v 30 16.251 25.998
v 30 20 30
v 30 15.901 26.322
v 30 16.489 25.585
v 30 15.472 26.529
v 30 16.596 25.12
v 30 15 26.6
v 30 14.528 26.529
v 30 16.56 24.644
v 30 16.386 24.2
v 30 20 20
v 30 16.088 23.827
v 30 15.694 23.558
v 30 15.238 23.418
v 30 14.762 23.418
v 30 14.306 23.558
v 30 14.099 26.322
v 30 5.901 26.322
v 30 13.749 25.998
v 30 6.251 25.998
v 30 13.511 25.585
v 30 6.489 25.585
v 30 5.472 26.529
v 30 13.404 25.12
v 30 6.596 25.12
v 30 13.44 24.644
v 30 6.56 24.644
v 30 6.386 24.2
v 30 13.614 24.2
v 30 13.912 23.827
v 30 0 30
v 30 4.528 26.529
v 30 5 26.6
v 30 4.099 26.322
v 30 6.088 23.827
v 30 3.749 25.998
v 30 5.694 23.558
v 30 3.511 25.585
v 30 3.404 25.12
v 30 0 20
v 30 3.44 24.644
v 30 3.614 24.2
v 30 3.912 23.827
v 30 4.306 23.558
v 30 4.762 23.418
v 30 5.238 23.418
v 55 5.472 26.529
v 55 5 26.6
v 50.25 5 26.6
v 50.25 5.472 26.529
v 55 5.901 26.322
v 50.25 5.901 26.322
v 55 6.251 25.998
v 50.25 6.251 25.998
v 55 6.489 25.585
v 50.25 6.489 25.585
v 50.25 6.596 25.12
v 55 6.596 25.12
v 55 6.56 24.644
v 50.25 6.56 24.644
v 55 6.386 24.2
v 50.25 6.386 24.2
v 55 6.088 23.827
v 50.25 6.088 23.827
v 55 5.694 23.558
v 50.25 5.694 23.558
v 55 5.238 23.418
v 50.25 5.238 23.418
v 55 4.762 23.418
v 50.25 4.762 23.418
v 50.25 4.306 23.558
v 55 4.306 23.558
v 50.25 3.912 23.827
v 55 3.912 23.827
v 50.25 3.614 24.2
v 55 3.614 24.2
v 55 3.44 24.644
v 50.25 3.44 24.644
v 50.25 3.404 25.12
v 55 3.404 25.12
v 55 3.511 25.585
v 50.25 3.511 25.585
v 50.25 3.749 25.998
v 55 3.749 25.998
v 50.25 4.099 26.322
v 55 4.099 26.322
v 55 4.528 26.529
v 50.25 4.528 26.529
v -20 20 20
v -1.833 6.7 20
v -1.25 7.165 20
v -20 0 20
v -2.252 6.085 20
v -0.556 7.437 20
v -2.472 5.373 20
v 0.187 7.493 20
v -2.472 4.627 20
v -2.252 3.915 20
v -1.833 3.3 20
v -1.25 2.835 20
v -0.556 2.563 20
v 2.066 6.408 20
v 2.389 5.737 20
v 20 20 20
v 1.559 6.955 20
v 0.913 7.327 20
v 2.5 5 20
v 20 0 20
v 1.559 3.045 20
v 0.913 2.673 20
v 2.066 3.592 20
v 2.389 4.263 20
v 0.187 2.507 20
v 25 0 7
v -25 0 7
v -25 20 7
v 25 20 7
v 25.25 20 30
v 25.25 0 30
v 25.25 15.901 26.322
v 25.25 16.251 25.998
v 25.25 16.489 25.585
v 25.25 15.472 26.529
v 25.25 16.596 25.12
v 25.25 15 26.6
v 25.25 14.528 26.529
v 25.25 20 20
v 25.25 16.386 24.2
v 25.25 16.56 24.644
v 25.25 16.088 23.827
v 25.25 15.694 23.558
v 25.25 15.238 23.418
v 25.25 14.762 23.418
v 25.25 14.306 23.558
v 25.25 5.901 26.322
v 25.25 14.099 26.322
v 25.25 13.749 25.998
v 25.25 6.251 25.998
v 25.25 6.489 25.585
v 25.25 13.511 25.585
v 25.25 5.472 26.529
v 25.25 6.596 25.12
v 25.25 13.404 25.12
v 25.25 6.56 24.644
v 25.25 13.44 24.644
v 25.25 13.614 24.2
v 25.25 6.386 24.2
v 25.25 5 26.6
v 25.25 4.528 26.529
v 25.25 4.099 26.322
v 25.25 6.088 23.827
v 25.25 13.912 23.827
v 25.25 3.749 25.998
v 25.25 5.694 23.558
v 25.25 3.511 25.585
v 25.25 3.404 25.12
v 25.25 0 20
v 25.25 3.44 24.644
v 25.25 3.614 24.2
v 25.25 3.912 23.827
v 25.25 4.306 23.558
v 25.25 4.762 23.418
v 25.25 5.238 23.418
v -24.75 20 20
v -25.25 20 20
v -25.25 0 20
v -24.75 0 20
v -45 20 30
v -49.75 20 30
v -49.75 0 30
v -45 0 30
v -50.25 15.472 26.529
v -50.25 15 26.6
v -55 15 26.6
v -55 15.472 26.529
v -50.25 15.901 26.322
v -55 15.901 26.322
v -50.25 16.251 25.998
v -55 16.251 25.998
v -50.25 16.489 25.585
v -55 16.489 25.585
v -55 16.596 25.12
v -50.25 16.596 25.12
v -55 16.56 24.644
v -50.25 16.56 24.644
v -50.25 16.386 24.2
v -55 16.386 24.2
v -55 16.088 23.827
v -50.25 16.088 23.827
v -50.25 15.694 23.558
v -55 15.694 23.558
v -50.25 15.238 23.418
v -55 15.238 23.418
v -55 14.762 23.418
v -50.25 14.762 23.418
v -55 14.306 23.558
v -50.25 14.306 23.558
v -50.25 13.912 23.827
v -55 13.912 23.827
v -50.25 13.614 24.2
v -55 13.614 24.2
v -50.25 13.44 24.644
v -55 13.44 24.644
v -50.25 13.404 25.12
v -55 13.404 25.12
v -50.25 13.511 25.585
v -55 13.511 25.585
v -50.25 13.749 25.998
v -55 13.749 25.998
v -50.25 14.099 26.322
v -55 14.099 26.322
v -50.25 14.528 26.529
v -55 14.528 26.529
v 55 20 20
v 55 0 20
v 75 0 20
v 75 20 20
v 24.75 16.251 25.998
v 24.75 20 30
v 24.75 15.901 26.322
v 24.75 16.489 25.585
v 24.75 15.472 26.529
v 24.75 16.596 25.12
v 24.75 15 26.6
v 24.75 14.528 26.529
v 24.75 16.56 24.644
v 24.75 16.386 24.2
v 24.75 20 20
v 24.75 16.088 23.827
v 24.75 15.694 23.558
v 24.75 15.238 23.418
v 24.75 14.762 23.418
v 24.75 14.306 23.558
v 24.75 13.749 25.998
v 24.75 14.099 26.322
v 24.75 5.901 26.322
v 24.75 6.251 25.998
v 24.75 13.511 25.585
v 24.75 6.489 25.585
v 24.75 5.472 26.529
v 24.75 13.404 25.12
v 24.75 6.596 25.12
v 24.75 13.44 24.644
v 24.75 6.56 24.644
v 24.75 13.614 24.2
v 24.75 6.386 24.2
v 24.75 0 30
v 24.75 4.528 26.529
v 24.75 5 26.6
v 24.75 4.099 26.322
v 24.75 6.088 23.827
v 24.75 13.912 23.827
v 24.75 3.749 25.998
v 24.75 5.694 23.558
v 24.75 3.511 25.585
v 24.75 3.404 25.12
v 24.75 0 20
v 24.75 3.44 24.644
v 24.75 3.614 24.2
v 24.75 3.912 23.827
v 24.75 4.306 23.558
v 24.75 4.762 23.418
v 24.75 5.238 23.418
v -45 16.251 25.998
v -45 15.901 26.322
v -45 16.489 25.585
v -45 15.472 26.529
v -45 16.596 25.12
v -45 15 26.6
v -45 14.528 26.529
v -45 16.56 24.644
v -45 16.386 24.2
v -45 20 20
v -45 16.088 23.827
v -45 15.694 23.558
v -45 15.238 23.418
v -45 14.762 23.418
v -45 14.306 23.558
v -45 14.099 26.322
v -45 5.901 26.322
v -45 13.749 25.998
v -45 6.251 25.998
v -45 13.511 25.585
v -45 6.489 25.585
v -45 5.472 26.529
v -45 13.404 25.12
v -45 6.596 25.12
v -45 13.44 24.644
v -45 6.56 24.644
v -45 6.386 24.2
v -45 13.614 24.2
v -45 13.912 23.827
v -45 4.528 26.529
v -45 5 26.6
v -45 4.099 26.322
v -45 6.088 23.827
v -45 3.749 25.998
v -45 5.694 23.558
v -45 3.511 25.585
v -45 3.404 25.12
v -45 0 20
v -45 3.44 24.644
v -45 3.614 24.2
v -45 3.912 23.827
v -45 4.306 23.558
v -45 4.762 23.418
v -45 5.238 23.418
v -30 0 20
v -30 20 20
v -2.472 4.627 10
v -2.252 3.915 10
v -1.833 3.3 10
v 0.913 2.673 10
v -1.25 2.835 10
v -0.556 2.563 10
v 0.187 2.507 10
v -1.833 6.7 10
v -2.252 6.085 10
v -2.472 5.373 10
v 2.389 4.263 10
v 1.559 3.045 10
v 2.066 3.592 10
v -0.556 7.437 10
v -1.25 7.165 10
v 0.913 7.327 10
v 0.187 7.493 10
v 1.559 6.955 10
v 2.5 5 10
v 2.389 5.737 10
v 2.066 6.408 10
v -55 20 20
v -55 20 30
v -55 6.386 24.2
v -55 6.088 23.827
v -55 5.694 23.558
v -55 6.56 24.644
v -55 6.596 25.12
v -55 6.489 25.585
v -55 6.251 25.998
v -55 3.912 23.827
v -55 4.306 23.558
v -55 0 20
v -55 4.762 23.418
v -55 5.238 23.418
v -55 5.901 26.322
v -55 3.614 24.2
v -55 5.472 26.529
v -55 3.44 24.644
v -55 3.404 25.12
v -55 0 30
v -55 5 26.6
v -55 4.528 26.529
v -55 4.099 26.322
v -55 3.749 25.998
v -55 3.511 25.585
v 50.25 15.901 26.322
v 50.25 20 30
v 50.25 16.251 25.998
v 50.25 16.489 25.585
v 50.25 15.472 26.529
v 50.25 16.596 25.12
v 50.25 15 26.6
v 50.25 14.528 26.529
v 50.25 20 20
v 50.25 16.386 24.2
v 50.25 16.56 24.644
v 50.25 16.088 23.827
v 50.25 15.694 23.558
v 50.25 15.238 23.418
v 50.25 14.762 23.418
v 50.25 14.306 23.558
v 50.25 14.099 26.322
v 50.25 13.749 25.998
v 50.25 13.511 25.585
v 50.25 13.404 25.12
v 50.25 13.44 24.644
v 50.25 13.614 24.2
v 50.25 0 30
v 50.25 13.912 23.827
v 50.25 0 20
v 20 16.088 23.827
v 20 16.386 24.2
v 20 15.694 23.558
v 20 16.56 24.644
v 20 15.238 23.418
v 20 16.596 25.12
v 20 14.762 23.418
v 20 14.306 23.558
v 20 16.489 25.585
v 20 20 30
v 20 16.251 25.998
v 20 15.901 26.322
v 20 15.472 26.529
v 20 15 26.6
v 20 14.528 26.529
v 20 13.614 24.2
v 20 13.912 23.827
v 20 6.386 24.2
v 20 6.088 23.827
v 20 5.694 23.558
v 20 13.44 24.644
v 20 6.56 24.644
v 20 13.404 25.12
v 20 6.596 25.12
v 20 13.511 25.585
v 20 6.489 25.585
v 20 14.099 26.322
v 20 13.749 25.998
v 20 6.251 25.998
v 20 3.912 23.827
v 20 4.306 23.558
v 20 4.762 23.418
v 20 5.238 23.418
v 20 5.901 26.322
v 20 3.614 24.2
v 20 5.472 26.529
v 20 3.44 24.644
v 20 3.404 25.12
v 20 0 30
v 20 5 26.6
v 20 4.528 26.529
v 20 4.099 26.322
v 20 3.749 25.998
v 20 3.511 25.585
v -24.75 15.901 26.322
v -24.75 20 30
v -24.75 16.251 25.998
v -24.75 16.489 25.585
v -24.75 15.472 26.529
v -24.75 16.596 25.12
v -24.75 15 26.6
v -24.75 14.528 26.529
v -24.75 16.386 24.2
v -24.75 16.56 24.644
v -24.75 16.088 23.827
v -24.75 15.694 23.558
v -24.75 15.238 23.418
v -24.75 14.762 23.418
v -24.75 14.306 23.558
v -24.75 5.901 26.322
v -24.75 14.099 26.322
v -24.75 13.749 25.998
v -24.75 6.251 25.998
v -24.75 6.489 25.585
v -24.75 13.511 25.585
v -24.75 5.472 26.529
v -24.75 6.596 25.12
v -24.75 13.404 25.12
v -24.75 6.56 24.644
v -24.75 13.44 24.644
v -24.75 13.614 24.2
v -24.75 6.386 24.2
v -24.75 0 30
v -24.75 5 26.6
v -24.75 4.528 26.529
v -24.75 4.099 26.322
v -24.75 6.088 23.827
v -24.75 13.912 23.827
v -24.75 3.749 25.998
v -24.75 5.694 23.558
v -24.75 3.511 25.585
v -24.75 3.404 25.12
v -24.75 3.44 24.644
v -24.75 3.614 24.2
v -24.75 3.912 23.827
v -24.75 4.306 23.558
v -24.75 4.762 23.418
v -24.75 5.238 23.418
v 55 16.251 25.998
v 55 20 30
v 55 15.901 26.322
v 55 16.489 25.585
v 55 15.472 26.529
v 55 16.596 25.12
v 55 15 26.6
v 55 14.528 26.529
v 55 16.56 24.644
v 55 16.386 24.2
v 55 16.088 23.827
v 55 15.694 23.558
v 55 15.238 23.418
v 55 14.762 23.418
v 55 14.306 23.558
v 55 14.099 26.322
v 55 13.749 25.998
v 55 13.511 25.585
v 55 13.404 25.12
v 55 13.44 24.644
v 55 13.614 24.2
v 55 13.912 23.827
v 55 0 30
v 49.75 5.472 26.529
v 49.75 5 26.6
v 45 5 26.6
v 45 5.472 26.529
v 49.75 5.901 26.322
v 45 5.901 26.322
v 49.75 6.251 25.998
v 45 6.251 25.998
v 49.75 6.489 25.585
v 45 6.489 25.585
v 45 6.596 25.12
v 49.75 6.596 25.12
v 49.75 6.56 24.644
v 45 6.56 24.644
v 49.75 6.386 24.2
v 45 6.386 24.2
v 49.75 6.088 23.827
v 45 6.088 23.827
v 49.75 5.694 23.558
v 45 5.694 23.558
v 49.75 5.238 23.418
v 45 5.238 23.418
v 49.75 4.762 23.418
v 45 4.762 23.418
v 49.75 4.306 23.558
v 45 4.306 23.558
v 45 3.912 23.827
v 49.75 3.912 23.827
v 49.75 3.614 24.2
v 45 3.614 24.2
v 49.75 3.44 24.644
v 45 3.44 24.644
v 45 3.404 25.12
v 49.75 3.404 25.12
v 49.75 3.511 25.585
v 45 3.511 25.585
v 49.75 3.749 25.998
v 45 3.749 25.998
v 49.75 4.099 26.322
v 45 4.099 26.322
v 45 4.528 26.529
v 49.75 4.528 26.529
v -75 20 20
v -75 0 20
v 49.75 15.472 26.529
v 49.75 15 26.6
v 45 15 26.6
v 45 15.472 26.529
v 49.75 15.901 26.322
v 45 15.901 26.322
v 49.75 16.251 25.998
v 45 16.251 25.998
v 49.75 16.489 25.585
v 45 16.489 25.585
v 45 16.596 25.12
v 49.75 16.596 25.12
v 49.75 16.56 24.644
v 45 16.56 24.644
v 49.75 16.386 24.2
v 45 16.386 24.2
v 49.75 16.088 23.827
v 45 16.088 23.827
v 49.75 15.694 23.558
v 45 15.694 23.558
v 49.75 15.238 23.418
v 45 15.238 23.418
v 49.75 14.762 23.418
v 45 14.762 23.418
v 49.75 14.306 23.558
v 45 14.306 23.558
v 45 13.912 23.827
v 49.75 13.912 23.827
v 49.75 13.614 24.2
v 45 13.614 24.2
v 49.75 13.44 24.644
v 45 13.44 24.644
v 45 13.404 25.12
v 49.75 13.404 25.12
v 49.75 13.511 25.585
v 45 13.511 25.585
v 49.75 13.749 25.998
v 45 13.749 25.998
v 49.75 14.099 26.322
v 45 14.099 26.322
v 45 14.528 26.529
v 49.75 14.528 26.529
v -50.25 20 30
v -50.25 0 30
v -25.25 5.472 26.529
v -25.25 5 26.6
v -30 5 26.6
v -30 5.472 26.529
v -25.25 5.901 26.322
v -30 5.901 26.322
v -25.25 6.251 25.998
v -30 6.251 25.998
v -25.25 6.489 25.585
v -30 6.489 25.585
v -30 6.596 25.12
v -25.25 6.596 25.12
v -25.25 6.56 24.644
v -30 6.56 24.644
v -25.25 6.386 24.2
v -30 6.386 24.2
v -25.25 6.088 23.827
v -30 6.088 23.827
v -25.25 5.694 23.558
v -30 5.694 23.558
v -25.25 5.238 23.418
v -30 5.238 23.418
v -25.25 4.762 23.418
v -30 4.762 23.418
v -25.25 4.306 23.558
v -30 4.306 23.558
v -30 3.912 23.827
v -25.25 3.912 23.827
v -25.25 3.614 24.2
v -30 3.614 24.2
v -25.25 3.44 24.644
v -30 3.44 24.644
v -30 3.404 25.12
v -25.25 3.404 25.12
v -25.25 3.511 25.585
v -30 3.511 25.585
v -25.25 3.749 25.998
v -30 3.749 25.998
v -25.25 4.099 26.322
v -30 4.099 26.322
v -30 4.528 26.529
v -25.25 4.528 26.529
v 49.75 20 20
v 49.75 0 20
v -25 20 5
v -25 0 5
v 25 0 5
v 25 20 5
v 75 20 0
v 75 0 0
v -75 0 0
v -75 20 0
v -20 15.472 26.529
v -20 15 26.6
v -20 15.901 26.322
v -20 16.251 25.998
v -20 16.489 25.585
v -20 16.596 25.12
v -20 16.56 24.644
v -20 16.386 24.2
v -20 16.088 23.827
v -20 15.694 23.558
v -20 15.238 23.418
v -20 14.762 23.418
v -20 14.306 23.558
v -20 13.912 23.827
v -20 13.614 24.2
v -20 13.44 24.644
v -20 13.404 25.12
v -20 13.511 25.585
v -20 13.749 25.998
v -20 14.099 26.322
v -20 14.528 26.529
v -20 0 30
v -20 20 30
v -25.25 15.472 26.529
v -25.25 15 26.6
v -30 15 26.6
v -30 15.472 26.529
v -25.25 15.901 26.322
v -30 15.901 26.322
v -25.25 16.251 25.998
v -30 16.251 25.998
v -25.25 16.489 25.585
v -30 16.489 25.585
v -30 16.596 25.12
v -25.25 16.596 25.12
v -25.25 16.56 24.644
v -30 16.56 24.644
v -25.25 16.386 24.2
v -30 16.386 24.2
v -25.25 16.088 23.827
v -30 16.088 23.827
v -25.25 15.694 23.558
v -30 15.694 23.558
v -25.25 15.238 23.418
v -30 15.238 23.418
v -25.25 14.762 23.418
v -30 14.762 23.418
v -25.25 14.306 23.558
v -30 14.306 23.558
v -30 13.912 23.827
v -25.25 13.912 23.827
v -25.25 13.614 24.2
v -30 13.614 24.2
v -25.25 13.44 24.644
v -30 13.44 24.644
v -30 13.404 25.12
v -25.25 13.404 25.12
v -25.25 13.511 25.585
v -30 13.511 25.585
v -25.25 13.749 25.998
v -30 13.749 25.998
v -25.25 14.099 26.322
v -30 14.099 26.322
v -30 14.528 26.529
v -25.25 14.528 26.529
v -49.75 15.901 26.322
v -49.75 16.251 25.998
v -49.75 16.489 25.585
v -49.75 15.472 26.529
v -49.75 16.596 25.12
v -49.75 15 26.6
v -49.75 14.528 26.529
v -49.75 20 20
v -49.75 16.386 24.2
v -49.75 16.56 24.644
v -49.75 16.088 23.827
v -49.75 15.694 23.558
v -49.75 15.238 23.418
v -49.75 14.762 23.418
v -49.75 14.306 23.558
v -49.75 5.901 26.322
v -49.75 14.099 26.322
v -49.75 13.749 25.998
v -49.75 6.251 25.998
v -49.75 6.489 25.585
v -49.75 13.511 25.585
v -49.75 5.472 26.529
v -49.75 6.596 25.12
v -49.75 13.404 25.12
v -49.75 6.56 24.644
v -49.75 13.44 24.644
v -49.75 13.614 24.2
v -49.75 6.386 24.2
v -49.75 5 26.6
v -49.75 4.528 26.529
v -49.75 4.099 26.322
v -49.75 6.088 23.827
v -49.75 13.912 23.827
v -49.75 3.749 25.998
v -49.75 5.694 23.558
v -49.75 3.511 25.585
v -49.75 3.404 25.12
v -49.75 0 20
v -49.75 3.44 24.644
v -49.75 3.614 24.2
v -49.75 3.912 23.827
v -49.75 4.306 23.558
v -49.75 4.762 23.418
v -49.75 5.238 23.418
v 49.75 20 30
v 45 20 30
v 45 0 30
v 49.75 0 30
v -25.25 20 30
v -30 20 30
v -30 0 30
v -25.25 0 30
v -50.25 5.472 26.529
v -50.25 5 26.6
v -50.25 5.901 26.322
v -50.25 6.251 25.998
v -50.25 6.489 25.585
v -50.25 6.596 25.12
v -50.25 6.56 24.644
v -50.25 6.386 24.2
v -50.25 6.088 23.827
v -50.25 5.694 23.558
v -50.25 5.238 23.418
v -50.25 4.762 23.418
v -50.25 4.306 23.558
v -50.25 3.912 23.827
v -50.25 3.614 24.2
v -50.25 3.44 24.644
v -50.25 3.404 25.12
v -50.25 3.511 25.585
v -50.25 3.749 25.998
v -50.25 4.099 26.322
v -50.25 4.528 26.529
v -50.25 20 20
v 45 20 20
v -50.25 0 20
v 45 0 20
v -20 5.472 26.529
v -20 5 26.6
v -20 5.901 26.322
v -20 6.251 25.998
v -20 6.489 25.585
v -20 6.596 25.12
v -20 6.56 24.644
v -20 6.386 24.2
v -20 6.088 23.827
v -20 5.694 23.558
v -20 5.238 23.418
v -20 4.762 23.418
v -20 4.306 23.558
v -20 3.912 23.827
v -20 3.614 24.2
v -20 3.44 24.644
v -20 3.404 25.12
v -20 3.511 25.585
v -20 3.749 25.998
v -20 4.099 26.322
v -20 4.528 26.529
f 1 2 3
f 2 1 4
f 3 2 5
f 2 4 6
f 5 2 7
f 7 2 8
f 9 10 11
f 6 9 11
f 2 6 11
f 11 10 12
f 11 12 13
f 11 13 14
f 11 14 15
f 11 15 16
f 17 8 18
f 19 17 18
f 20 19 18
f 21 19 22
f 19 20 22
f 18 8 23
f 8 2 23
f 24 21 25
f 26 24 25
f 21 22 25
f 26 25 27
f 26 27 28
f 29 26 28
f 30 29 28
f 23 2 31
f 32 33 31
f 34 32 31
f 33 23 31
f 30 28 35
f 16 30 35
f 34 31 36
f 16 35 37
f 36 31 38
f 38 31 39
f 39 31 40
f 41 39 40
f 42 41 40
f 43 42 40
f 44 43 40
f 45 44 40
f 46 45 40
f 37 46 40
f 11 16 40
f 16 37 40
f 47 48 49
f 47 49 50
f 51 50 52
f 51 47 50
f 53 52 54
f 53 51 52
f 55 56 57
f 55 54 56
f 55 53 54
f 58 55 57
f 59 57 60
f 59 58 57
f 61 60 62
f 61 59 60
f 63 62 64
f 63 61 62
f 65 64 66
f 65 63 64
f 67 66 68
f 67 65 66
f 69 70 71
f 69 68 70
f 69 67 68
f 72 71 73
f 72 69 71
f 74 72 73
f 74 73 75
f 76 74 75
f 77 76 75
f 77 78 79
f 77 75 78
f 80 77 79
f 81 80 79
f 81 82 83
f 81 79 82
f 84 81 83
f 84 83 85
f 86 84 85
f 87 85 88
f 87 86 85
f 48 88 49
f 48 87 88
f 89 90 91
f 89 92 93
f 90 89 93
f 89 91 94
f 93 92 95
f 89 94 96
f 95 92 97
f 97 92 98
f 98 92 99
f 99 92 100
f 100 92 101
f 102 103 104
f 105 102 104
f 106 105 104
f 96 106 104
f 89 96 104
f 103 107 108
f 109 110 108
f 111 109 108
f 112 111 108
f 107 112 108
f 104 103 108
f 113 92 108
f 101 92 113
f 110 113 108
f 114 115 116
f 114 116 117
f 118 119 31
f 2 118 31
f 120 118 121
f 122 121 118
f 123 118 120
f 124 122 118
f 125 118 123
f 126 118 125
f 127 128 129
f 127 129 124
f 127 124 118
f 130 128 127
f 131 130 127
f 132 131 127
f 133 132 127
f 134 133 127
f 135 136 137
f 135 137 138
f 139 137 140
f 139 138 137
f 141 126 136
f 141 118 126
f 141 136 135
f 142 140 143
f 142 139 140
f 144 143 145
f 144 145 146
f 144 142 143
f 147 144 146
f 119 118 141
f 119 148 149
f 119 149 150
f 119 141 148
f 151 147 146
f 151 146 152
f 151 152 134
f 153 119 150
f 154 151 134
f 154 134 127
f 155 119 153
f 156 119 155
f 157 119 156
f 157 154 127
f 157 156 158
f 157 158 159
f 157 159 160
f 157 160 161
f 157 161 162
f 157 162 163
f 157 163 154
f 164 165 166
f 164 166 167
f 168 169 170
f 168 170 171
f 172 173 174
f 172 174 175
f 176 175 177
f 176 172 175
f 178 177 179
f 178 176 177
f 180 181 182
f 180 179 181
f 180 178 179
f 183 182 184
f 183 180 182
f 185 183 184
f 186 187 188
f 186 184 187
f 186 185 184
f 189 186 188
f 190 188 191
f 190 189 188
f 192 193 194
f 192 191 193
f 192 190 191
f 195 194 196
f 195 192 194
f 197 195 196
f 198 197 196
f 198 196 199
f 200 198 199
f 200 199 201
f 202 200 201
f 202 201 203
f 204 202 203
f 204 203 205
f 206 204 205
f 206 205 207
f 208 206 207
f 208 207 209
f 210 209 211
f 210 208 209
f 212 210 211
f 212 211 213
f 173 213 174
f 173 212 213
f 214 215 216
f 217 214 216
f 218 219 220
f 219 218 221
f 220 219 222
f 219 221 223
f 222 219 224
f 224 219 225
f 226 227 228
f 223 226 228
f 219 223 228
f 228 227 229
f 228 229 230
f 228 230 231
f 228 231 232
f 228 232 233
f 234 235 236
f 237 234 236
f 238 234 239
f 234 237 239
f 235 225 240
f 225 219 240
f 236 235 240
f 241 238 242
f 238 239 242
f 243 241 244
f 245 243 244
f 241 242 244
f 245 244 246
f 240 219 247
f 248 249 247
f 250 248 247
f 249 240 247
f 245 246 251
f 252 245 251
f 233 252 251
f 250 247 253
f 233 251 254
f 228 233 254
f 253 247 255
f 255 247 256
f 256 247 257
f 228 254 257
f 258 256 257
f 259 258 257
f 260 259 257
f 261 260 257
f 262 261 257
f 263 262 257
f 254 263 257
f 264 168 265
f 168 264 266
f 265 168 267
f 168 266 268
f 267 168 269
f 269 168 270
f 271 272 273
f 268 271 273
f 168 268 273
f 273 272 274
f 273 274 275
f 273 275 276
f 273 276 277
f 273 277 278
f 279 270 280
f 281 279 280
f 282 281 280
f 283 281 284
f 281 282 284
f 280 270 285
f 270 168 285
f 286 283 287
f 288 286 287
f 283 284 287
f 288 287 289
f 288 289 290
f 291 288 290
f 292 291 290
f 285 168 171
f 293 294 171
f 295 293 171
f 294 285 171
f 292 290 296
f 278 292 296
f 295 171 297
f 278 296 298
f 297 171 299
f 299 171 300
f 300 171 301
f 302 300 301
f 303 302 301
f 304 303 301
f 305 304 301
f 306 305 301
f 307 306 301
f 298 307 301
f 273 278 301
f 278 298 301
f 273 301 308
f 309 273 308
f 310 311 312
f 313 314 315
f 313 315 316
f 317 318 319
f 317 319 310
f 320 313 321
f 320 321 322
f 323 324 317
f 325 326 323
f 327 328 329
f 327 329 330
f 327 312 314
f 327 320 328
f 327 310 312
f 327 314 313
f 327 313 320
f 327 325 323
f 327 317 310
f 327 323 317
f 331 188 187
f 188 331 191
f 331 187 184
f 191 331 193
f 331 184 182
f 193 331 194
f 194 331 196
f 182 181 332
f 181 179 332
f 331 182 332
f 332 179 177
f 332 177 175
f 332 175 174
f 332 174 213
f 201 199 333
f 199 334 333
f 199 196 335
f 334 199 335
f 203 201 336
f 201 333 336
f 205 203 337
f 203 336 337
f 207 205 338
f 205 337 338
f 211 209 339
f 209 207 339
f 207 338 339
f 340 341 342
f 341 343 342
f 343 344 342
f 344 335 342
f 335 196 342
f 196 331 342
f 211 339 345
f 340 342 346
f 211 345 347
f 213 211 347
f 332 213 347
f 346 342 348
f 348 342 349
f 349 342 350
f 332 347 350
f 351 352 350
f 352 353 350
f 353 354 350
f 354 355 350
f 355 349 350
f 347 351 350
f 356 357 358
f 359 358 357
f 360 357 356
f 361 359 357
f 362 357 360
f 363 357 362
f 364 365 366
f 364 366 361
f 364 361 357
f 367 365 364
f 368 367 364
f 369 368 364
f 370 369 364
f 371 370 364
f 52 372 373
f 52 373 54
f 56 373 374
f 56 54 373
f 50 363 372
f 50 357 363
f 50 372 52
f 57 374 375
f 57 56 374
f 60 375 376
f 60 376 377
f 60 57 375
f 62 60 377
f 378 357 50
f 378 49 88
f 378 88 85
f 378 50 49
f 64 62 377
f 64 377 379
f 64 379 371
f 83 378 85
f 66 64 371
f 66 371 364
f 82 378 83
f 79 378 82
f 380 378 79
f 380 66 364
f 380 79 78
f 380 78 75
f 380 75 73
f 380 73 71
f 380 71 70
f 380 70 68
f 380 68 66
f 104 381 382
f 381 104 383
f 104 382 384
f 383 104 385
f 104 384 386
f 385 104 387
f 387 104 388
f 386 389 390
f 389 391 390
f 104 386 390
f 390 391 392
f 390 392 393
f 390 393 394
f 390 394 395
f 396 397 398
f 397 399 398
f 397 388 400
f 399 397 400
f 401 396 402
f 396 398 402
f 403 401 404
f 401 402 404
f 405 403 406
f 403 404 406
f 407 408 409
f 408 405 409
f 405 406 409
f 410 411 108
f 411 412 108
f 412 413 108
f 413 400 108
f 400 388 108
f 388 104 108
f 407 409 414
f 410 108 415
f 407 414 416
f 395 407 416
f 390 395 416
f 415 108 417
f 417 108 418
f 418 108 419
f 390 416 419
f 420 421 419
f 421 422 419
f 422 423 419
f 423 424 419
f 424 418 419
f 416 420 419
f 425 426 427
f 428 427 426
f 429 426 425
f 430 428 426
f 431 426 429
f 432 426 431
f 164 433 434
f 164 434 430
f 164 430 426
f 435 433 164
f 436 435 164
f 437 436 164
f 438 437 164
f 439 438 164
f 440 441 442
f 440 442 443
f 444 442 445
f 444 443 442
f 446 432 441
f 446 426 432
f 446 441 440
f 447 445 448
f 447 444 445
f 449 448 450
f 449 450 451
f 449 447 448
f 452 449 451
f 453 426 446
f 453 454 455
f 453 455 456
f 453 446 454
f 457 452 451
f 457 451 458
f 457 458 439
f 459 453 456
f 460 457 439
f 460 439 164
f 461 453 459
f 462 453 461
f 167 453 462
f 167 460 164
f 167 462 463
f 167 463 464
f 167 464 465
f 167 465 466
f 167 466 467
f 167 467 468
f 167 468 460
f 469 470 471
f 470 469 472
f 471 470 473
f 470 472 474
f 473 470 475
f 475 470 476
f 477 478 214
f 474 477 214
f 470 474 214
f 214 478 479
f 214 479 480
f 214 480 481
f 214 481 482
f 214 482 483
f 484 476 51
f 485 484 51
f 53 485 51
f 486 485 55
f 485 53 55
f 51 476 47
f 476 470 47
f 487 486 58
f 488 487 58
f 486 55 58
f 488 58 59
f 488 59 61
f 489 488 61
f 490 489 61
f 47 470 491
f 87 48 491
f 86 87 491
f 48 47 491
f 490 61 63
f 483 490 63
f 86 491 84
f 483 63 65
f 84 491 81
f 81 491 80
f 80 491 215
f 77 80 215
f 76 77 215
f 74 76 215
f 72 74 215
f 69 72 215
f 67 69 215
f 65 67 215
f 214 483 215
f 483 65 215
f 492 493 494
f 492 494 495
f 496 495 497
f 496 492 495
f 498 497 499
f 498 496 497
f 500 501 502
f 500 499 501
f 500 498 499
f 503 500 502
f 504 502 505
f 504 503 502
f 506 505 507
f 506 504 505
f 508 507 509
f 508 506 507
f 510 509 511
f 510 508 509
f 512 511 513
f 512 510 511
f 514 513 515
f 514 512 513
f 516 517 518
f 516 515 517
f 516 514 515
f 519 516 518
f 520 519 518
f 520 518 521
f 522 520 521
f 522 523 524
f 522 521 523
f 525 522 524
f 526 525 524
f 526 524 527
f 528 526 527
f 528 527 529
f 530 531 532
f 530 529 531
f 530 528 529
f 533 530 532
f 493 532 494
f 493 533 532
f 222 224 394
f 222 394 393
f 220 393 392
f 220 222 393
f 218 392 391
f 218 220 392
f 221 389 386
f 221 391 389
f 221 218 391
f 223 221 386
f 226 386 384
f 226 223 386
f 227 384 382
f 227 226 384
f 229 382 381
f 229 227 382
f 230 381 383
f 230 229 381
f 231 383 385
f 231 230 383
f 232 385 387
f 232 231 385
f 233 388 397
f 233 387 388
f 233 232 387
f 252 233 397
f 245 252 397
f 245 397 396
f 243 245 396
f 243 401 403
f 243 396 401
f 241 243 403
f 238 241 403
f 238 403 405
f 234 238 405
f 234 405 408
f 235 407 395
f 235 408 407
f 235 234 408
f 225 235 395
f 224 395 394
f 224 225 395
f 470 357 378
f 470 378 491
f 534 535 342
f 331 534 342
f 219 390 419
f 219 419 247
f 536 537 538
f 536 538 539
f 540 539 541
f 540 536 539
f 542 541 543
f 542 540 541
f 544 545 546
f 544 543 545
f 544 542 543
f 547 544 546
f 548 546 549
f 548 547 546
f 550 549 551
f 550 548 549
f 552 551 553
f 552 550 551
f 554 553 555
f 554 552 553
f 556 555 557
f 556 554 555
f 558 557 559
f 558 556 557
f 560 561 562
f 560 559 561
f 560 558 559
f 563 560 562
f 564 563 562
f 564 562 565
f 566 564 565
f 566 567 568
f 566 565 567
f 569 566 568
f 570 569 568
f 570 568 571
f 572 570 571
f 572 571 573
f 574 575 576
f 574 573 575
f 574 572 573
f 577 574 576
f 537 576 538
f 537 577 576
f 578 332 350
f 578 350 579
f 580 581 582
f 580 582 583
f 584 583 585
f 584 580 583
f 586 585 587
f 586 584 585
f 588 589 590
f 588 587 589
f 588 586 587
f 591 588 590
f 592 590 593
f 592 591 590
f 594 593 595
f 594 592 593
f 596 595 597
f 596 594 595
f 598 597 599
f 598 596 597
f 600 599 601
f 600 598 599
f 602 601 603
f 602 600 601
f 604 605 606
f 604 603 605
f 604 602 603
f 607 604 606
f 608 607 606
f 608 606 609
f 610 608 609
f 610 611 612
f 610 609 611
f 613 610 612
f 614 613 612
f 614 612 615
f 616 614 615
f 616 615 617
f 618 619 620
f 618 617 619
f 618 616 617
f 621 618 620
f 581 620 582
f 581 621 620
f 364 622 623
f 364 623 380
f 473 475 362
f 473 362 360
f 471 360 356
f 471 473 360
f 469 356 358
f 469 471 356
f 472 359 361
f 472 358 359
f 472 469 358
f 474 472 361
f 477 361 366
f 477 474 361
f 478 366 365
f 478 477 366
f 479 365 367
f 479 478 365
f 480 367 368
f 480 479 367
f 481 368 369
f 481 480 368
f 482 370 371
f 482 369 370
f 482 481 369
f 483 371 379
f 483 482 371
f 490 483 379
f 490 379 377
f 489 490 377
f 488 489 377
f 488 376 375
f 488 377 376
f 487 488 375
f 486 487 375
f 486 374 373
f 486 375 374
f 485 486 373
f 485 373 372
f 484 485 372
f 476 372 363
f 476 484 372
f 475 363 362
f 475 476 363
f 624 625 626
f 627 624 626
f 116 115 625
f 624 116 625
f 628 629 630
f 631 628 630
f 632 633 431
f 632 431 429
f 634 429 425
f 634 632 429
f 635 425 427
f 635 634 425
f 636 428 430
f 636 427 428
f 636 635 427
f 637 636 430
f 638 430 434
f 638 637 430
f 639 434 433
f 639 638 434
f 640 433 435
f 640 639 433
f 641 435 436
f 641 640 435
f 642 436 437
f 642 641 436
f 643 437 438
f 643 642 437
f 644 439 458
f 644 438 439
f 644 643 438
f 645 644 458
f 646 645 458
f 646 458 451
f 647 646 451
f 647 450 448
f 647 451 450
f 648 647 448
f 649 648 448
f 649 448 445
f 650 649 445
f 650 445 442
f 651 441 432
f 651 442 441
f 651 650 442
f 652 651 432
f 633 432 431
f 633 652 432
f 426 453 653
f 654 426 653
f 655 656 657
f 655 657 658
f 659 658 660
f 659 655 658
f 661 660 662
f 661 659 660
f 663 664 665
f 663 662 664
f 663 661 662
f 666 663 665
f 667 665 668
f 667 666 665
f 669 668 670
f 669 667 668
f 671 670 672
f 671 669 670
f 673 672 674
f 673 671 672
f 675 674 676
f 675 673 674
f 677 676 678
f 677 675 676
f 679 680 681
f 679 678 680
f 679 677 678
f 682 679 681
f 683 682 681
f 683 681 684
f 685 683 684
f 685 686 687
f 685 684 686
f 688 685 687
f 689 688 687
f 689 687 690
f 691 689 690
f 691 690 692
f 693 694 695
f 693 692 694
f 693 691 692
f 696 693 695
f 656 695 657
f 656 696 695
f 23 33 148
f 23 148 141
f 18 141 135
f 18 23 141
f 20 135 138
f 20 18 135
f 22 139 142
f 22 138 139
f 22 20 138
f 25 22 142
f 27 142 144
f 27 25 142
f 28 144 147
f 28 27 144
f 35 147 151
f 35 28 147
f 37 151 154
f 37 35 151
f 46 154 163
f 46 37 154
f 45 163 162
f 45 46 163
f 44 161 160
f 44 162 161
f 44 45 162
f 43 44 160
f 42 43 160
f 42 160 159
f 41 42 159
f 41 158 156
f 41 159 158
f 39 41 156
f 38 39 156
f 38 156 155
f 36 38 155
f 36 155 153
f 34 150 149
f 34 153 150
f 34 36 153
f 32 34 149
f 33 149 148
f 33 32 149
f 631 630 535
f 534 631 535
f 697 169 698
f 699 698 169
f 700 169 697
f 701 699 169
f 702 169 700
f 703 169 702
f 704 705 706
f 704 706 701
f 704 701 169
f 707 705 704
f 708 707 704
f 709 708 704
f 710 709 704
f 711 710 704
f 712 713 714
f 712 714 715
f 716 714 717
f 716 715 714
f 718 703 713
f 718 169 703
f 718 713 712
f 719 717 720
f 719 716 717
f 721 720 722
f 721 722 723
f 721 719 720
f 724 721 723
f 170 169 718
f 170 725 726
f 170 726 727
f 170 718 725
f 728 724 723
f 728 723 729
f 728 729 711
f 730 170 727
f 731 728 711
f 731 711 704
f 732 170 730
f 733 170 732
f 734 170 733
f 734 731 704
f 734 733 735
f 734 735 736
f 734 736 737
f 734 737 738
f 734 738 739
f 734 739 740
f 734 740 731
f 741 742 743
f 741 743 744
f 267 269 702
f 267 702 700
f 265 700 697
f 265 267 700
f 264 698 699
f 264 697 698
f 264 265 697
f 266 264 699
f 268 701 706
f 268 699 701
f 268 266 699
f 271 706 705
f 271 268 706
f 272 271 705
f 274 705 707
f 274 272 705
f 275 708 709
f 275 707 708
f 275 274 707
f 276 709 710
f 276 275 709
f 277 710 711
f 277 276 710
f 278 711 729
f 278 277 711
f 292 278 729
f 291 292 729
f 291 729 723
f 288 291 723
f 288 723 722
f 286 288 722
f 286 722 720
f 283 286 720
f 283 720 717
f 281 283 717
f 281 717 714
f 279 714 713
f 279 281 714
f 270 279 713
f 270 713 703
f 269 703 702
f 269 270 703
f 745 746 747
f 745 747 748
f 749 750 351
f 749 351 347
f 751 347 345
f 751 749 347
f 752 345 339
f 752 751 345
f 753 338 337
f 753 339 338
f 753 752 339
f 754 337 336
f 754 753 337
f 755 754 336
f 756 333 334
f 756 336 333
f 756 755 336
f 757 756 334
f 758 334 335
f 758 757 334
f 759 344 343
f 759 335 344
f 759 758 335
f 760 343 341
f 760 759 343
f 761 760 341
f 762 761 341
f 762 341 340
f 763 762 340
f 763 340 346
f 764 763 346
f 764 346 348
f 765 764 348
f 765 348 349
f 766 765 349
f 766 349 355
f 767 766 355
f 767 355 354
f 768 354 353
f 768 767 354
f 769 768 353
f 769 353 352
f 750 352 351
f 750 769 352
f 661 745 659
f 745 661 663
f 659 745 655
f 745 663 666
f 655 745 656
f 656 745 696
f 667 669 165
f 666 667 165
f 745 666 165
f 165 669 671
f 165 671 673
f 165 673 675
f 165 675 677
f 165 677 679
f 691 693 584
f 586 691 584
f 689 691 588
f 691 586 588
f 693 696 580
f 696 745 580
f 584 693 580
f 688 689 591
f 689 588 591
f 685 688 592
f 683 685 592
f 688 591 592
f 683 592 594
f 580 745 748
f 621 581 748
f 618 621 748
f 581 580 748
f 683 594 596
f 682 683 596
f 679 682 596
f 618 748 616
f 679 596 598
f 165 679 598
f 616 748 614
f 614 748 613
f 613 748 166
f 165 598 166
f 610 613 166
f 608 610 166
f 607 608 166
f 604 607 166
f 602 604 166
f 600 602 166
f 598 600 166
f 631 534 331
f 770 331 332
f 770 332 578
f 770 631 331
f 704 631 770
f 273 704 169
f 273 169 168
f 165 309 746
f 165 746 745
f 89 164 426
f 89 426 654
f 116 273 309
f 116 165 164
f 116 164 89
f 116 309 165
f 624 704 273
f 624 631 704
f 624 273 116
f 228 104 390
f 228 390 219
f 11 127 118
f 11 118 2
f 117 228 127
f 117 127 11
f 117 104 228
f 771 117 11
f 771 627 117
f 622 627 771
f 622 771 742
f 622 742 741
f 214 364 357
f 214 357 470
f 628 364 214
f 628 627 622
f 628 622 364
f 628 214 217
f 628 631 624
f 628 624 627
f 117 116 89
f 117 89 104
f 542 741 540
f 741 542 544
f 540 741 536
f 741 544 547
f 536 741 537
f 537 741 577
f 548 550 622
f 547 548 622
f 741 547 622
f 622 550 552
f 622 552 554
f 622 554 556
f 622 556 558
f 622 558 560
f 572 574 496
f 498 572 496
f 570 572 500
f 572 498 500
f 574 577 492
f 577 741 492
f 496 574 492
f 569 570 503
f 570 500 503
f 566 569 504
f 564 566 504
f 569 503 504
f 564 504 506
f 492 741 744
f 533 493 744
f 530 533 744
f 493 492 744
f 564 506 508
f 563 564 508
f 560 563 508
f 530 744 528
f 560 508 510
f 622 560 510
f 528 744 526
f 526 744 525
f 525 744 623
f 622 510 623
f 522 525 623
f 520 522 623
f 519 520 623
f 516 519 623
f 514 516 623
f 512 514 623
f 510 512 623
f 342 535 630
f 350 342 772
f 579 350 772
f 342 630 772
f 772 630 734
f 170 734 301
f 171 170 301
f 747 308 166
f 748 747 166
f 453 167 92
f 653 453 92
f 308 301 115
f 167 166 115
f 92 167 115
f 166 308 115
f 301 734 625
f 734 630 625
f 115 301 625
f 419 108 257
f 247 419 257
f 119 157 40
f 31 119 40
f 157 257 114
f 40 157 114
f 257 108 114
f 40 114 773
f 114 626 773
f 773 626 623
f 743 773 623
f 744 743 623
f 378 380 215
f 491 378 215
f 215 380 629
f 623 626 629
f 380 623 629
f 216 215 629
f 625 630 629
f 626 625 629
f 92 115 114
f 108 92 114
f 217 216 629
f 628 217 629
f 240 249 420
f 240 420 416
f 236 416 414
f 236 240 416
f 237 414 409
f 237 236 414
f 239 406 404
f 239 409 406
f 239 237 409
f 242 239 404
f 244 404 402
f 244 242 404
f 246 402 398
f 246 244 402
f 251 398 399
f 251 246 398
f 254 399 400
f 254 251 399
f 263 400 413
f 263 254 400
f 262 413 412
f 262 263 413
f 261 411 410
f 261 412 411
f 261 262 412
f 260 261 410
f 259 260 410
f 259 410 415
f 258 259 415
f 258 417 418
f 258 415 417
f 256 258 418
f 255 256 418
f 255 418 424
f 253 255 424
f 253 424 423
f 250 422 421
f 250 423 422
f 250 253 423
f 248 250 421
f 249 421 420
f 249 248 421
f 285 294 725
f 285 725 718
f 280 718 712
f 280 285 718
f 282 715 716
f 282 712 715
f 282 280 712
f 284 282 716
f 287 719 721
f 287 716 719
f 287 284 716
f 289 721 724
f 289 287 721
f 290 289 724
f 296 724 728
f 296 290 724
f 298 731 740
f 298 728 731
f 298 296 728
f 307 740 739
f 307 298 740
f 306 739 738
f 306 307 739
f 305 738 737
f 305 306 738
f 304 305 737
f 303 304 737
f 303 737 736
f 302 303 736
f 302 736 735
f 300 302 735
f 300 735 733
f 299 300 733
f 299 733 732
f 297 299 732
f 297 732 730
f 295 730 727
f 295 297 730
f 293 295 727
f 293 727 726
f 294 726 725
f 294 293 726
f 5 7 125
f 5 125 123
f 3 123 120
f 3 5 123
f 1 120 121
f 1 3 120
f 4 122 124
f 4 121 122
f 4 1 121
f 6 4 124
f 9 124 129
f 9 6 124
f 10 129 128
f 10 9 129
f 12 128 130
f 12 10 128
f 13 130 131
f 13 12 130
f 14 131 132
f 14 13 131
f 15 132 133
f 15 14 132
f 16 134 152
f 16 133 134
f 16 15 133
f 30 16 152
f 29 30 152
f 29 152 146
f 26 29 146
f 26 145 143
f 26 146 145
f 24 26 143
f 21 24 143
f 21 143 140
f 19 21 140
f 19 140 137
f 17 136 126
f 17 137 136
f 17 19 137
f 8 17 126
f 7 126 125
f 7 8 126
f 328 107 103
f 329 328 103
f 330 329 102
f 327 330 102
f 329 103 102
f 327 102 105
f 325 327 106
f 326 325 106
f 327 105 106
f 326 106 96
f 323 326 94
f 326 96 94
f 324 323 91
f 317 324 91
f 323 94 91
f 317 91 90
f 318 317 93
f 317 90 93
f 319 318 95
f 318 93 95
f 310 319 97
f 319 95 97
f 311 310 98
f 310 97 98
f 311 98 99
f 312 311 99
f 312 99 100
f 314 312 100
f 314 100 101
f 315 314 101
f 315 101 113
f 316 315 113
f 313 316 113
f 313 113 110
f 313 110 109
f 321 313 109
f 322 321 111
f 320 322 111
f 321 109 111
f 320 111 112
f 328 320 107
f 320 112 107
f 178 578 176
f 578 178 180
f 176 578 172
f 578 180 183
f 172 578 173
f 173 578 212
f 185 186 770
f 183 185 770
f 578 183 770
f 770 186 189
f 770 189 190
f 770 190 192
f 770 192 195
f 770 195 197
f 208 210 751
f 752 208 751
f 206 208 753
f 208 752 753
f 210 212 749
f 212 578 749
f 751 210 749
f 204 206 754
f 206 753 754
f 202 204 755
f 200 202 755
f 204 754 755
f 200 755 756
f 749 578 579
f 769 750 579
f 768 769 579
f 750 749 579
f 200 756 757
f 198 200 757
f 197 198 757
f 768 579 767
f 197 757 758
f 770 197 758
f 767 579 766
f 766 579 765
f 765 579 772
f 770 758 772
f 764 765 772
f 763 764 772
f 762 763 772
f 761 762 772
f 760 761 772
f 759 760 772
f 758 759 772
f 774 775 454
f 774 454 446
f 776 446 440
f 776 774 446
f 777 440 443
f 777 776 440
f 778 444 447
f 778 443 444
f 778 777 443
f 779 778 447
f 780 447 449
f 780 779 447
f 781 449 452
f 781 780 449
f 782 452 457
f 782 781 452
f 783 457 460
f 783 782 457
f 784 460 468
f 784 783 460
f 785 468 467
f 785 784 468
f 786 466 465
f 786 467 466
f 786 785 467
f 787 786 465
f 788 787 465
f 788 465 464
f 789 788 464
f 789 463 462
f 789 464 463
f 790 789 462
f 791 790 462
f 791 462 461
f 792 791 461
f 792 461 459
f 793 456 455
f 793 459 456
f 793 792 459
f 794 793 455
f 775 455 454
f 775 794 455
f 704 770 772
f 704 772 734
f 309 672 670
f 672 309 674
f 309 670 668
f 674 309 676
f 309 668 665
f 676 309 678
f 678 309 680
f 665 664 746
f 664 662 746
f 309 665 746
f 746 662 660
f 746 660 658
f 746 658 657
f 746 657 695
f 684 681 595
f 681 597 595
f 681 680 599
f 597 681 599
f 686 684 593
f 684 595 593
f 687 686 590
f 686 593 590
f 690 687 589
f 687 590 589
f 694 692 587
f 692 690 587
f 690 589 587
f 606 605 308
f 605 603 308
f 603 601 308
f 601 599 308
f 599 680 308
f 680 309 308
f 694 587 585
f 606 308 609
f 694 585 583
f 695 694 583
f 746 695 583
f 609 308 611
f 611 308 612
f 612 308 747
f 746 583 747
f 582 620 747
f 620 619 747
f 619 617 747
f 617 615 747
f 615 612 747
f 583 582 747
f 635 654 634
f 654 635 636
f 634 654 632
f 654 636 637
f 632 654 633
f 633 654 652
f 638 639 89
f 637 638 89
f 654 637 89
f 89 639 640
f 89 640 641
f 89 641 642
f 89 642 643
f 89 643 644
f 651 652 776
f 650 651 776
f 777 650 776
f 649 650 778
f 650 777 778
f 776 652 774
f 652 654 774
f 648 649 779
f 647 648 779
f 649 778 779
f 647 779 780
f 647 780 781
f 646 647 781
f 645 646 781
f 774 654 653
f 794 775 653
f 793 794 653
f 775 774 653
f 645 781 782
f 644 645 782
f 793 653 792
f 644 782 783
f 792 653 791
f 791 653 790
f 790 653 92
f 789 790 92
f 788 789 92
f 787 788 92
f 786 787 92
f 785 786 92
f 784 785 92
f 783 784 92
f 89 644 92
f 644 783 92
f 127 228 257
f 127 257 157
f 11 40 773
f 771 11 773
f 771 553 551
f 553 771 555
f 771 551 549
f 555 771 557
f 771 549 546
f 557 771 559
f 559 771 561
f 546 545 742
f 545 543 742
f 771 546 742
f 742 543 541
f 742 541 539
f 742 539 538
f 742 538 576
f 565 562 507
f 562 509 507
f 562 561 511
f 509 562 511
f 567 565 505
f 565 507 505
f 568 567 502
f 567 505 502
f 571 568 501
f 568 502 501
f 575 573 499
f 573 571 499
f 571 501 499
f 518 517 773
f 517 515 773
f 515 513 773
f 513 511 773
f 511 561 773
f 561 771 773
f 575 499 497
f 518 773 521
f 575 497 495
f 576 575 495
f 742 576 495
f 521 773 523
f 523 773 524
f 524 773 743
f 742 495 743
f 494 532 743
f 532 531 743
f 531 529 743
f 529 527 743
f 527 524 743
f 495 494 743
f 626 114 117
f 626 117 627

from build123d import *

# Parameters (mm, degrees)
BOSS_EXTRUDE1_DEPTH     = 20
CUT_EXTRUDE1_DEPTH      = 84.216584885
CUT_EXTRUDE1_DEPTH_BACK = 84.216584885
SKETCH2_W               = 0.5
SKETCH2_H               = 10
CUT_EXTRUDE2_DEPTH      = 135.907375632
CUT_EXTRUDE2_DEPTH_BACK = 135.907375632
SKETCH3_R               = 1.6
CUT_EXTRUDE3_DEPTH      = 84.216584885
CUT_EXTRUDE3_DEPTH_BACK = 84.216584885
SKETCH4_W               = 50
SKETCH4_H               = 2
SKETCH5_R               = 2.5
CUT_EXTRUDE4_DEPTH      = 10


with BuildPart() as part:
    # Sketch1 → Boss-Extrude1 (new body)
    with BuildSketch(Plane(origin=(0, 0, 0), x_dir=(1, 0, 0), z_dir=(0, 1, 0))):
        Polygon((0, 0), (-75, 0), (-75, -20), (-55, -20), (-55, -30), (-45, -30), (-45, -20), (-30, -20), (-30, -30), (-20, -30), (-20, -20), (20, -20), (20, -30), (30, -30), (30, -20), (45, -20), (45, -30), (55, -30), (55, -20), (75, -20), (75, 0), align=None)
    extrude(amount=BOSS_EXTRUDE1_DEPTH)

    # Sketch2 → Cut-Extrude1 (cut, two sides: drawn at the far end of the back side and taken through both)
    with BuildSketch(Plane(origin=(0, 20, 0), x_dir=(1, 0, 0), z_dir=(0, 1, 0)).offset(-CUT_EXTRUDE1_DEPTH_BACK)):
        with Locations((-50, -25)):
            Rectangle(SKETCH2_W, SKETCH2_H)
        with Locations((-25, -25)):
            Rectangle(SKETCH2_W, SKETCH2_H)
        with Locations((25, -25)):
            Rectangle(SKETCH2_W, SKETCH2_H)
        with Locations((50, -25)):
            Rectangle(SKETCH2_W, SKETCH2_H)
    extrude(amount=CUT_EXTRUDE1_DEPTH + CUT_EXTRUDE1_DEPTH_BACK, mode=Mode.SUBTRACT)

    # Sketch3 → Cut-Extrude2 (cut, two sides: drawn at the far end of the back side and taken through both)
    with BuildSketch(Plane.ZY.offset(55).offset(-CUT_EXTRUDE2_DEPTH_BACK)):
        with Locations((25, 15)):
            Circle(SKETCH3_R)
        with Locations((25, 5)):
            Circle(SKETCH3_R)
    extrude(amount=CUT_EXTRUDE2_DEPTH + CUT_EXTRUDE2_DEPTH_BACK, mode=Mode.SUBTRACT)

    # Sketch4 → Cut-Extrude3 (cut, two sides: drawn at the far end of the back side and taken through both)
    with BuildSketch(Plane(origin=(0, 20, 0), x_dir=(1, 0, 0), z_dir=(0, 1, 0)).offset(-CUT_EXTRUDE3_DEPTH_BACK)):
        with Locations((0, -6)):
            Rectangle(SKETCH4_W, SKETCH4_H)
    extrude(amount=CUT_EXTRUDE3_DEPTH + CUT_EXTRUDE3_DEPTH_BACK, mode=Mode.SUBTRACT)

    # Sketch5 → Cut-Extrude4 (cut)
    with BuildSketch(Plane.XY.offset(20)):
        with Locations((0, 5)):
            Circle(SKETCH5_R)
    extrude(amount=-CUT_EXTRUDE4_DEPTH, mode=Mode.SUBTRACT)


solid = part.part
